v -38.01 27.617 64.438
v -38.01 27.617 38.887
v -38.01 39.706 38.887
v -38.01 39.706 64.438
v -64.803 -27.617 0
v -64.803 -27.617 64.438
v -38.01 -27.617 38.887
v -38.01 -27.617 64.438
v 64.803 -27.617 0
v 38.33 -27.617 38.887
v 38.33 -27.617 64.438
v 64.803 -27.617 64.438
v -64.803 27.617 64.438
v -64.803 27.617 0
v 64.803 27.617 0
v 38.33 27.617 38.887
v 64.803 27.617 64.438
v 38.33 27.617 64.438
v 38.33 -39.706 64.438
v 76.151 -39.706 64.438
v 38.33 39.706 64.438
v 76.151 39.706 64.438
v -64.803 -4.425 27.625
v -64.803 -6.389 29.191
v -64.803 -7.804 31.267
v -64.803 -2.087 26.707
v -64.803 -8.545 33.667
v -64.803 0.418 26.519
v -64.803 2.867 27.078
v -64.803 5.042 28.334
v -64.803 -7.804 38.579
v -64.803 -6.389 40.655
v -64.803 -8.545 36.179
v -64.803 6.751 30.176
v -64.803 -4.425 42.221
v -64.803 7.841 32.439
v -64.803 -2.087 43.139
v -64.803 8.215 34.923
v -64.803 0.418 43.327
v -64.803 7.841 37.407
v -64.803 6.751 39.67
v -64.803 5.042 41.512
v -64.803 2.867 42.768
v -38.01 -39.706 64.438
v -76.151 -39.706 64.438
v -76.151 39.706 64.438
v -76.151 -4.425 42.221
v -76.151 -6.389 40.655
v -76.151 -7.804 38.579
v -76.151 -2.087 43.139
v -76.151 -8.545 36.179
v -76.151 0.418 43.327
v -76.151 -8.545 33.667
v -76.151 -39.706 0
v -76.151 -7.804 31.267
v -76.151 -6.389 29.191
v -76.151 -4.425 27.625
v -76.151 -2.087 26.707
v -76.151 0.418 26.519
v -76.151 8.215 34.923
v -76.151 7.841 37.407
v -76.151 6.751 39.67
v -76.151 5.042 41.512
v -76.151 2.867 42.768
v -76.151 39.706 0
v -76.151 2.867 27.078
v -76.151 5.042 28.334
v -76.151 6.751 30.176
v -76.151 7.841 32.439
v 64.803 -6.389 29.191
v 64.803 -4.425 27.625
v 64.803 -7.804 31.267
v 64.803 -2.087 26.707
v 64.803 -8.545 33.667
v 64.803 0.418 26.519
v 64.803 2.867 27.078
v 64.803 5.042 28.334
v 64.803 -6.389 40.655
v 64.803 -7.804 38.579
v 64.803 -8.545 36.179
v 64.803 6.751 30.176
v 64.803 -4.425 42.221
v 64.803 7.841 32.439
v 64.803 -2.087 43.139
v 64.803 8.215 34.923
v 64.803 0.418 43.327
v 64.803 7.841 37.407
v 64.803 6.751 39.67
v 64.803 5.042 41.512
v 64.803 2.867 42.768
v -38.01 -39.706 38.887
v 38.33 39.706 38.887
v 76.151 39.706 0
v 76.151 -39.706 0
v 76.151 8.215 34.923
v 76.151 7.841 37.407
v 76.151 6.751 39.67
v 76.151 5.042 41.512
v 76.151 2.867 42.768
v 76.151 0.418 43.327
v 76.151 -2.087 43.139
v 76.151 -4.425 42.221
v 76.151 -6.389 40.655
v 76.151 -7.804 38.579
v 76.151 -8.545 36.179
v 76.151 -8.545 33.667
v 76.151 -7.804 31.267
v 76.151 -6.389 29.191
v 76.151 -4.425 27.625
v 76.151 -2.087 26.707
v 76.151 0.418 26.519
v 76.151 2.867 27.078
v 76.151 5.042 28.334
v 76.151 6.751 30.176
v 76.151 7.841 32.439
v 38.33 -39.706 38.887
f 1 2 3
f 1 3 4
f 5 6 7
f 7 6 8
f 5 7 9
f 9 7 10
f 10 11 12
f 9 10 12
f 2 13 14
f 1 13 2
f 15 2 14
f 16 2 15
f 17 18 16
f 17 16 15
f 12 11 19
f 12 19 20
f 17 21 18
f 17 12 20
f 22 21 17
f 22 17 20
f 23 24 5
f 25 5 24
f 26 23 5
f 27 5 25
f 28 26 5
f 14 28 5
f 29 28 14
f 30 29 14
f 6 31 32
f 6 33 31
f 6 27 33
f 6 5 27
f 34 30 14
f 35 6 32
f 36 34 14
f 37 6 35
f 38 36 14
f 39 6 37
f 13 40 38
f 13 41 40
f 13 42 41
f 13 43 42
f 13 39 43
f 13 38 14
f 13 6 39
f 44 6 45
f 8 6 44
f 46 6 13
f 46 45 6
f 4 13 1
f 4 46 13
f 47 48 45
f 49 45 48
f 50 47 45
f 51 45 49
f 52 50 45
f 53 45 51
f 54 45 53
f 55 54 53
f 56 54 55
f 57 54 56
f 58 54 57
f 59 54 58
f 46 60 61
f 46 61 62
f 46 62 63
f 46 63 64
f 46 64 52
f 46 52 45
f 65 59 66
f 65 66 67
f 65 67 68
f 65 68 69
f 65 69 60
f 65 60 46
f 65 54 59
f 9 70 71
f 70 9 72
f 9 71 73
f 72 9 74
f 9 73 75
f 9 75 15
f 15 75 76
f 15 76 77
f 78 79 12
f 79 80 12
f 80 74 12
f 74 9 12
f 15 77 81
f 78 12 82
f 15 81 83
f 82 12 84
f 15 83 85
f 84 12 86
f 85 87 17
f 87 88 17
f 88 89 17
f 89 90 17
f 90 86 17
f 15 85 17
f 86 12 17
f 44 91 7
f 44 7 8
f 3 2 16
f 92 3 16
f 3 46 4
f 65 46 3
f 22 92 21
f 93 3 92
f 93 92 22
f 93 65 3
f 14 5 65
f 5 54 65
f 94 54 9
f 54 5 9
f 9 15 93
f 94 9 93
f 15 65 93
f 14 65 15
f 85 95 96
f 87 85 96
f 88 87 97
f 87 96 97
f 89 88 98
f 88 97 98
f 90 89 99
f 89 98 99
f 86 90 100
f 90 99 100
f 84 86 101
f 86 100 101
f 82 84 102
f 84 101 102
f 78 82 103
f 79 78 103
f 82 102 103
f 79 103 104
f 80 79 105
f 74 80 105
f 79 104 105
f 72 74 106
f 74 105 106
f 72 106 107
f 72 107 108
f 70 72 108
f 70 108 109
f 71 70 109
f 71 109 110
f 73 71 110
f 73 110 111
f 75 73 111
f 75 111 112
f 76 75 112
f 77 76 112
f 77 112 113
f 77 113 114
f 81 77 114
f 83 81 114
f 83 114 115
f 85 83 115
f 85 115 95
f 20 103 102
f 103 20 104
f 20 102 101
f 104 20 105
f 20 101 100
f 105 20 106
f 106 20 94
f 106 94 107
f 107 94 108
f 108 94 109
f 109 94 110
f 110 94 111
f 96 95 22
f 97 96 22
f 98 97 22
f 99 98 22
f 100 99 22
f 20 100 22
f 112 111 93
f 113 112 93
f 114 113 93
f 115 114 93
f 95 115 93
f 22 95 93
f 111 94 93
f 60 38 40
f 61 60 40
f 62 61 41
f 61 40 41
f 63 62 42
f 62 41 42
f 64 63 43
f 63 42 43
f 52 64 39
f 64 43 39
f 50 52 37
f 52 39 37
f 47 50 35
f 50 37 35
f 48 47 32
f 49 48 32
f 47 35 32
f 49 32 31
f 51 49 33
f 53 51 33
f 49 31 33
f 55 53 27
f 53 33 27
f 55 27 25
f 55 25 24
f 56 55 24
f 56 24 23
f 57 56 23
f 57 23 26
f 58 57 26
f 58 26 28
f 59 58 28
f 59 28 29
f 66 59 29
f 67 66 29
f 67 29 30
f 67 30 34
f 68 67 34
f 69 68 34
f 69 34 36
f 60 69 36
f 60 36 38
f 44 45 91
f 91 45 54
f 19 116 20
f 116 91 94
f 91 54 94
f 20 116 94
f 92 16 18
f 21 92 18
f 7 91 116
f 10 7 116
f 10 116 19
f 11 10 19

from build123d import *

# Parameters (mm, degrees)
F0_W     = 152.3013710976
F0_H     = 79.4126093388
F1_DEPTH = 64.4375029951
F2_W     = 129.606127739
F2_H     = 55.234760046
F3_DEPTH = 64.4385029951
F7_W     = 76.3396583498
F7_H     = 25.5502108485
F4_DEPTH = 79.4136093388
F5_R     = 8.4271514965
F6_DEPTH = 152.3023710976


with BuildPart() as f1:
    # F0 (on Top) → F1 (new body)
    with BuildSketch(Plane.XY):
        Rectangle(F0_W, F0_H)
    extrude(amount=F1_DEPTH)

    # F2 (on face) → F3 (cut, through all)
    with BuildSketch(Plane.XY.offset(64.4375029951)):
        Rectangle(F2_W, F2_H)
    extrude(amount=-F3_DEPTH, mode=Mode.SUBTRACT)

    # F7 (on face) → F4 (cut, through all)
    with BuildSketch(Plane.XZ.offset(39.7063046694)):
        with Locations((0.1601595432, 51.6623975709)):
            Rectangle(F7_W, F7_H)
    extrude(amount=-F4_DEPTH, mode=Mode.SUBTRACT)

    # F5 (on face) → F6 (cut, through all)
    with BuildSketch(Plane.YZ.offset(76.1506855488)):
        with Locations((-0.2117939293, 34.9230654538)):
            Circle(F5_R)
    extrude(amount=-F6_DEPTH, mode=Mode.SUBTRACT)


solid = f1.part
